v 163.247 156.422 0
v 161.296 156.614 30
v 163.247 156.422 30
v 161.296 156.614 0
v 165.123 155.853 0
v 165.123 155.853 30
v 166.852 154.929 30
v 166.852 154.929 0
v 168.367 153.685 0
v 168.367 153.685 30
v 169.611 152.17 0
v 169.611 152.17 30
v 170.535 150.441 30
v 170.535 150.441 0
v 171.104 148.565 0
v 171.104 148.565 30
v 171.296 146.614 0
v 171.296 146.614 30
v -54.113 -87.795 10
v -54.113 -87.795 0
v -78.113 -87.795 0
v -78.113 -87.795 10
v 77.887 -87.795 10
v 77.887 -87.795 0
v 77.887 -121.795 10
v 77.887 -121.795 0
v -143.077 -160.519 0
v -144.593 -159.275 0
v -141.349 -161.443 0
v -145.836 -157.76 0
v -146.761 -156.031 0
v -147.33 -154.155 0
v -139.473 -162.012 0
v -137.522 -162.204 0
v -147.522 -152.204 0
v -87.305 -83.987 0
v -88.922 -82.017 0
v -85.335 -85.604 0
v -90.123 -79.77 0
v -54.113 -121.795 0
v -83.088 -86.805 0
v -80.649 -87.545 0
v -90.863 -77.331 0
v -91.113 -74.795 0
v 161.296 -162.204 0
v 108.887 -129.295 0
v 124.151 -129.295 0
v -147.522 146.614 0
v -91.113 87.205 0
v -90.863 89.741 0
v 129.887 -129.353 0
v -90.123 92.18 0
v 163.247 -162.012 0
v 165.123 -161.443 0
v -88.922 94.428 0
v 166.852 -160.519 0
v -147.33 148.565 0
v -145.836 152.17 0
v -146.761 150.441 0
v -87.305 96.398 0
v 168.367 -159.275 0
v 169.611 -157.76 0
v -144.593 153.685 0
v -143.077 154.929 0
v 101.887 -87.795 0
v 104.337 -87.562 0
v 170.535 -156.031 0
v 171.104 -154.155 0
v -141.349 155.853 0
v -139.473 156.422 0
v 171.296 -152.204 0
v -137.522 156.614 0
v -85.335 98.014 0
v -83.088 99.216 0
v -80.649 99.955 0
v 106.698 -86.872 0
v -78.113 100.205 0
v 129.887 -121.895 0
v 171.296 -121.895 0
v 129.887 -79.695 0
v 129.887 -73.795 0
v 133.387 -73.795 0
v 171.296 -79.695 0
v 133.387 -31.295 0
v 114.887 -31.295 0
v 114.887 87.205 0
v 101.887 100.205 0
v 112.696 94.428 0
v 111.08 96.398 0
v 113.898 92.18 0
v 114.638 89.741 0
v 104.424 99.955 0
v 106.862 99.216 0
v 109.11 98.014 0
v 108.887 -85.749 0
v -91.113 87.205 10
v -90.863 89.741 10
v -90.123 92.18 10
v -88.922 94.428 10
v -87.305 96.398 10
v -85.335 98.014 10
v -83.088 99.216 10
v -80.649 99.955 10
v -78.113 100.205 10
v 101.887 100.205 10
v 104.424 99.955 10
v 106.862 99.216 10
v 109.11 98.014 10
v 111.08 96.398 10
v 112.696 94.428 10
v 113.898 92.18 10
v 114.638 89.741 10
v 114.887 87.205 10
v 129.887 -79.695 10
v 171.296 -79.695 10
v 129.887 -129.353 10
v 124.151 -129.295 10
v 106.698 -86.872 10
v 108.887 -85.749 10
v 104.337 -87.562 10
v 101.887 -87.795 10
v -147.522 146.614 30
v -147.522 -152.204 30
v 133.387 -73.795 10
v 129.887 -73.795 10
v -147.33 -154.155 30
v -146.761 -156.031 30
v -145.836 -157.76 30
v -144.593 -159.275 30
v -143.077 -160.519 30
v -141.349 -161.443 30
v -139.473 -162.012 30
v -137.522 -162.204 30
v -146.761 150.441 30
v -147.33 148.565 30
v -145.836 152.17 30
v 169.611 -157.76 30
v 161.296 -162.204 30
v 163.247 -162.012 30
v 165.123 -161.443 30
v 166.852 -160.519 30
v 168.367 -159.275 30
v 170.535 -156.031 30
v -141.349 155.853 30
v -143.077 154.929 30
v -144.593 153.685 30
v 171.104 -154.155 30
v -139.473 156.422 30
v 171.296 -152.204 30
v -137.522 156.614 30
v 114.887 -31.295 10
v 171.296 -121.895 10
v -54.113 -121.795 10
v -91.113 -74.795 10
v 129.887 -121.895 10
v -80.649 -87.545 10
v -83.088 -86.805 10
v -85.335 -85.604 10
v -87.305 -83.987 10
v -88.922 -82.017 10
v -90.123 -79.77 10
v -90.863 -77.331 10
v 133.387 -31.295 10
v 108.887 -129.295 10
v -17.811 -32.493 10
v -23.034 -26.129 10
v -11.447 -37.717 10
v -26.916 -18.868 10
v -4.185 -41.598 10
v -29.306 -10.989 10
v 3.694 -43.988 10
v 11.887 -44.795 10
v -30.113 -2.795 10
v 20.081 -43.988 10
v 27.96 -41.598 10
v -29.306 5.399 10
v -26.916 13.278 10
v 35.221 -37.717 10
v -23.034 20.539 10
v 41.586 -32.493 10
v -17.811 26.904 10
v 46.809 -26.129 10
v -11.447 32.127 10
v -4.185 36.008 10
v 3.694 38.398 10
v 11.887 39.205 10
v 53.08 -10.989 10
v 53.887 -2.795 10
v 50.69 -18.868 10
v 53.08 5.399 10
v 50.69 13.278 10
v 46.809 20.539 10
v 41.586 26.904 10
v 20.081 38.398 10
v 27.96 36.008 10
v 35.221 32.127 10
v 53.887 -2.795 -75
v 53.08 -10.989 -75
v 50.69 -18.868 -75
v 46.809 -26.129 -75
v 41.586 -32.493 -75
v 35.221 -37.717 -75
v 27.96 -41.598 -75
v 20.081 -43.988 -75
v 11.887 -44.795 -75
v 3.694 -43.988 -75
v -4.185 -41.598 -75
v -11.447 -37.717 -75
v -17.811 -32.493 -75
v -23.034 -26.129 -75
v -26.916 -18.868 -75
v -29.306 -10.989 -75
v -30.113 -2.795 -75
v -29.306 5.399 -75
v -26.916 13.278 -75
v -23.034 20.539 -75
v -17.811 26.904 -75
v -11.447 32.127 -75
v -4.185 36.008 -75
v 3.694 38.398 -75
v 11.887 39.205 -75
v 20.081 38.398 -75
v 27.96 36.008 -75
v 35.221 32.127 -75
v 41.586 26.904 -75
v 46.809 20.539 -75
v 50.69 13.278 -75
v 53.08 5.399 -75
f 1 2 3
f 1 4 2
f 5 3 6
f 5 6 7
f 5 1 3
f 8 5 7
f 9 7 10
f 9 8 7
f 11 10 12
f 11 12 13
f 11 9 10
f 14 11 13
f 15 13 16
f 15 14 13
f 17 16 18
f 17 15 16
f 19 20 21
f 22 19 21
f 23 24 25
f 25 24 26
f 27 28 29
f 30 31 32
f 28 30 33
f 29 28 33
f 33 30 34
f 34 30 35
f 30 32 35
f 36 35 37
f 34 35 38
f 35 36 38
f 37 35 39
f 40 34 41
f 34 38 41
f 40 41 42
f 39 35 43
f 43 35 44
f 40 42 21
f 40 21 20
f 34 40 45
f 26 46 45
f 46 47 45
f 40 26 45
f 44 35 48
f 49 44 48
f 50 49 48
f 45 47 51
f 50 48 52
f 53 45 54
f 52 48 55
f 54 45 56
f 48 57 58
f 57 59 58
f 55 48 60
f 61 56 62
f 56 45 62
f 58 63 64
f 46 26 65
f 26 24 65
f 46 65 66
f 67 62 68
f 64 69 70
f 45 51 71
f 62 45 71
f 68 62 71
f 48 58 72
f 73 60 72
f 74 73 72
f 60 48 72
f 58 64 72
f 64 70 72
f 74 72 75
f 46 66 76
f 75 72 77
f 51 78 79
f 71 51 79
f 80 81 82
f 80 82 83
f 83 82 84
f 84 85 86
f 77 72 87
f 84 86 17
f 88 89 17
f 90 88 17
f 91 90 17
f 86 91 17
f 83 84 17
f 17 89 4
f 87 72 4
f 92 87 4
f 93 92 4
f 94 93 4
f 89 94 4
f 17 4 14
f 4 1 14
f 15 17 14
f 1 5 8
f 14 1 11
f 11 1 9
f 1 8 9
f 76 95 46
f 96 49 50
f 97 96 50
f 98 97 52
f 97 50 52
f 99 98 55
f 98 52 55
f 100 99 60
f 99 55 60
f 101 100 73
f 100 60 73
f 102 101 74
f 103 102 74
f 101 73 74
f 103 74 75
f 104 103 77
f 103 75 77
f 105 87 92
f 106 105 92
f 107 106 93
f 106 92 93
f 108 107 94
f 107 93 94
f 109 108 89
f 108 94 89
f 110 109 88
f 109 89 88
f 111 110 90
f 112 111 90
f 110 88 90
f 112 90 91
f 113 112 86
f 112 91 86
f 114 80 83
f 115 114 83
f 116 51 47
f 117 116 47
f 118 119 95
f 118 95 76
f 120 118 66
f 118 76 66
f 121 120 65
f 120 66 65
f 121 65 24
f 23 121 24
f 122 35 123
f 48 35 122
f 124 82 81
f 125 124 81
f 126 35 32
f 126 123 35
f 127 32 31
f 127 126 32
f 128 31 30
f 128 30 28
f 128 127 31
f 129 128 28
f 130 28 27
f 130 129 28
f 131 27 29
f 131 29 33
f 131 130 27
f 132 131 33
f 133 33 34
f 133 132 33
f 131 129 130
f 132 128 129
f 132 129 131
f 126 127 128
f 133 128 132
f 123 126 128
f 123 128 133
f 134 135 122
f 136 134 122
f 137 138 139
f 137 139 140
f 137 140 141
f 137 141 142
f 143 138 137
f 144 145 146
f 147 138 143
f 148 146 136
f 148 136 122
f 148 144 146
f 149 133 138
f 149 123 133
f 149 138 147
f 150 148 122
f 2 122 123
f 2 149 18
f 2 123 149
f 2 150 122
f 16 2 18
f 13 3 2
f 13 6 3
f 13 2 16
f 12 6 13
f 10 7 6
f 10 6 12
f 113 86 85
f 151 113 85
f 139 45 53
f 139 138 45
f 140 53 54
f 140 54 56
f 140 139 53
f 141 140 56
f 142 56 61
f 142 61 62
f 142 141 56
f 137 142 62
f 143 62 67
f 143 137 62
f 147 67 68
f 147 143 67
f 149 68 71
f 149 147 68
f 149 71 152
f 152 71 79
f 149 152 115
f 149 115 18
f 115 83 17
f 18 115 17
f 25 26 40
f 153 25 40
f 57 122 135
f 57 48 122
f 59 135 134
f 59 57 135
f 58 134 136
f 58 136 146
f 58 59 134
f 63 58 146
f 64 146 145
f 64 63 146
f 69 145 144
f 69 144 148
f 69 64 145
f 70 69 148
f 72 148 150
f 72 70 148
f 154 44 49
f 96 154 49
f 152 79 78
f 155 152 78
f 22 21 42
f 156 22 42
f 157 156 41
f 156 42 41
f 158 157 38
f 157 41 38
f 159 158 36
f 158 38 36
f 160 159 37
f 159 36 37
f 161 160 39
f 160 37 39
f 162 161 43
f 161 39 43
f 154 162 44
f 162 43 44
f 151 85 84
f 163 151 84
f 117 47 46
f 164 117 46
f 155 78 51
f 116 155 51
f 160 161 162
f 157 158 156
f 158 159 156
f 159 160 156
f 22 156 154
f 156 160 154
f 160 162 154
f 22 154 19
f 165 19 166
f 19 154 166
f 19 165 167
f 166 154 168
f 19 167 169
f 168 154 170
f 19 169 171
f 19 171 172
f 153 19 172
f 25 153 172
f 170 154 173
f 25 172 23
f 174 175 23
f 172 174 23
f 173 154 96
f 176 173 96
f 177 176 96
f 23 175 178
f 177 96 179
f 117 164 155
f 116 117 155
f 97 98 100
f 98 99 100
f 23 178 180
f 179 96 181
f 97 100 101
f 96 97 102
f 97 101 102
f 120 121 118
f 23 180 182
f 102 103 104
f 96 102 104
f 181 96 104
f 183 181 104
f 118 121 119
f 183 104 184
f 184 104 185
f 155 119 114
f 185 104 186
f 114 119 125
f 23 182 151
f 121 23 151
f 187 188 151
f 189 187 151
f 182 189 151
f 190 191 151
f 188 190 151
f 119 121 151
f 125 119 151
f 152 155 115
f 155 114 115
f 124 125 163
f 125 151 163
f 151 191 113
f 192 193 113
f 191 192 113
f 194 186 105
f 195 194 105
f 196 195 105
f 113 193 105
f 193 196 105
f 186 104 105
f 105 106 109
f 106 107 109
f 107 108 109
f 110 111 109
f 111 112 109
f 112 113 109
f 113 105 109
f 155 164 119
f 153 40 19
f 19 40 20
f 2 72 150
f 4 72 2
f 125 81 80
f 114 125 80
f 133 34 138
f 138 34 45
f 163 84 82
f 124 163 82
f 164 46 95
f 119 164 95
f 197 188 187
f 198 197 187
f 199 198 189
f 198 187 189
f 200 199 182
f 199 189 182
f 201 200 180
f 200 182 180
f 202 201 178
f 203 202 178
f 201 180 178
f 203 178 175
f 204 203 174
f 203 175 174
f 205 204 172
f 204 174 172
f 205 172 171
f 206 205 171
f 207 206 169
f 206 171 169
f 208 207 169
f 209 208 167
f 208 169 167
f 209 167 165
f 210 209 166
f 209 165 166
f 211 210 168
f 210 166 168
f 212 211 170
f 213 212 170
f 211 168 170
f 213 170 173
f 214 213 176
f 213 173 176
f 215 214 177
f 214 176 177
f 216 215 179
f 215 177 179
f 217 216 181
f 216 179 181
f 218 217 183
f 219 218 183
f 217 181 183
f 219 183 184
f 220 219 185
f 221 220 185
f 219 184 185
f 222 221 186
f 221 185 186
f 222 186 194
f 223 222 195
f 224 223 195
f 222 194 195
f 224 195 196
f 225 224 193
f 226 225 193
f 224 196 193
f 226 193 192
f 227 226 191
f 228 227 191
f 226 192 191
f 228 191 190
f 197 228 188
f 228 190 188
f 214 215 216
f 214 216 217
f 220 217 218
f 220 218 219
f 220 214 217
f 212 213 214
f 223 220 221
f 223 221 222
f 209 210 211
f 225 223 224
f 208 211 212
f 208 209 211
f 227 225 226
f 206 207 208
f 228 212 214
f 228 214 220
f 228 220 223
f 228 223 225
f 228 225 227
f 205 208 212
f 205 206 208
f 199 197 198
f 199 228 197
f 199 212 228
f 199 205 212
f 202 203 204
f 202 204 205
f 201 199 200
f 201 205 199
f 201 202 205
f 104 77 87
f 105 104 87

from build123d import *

# Parameters (mm, degrees)
EXTRUDE_1_DEPTH = 10
SKETCH_4_W      = 318.818129974
SKETCH_4_H      = 318.818129974
EXTRUDE_3_DEPTH = 20
SKETCH_6_R      = 42
EXTRUDE_4_DEPTH = 85
FILLET_1_R      = 10


with BuildPart() as part:
    # 草图2 → 凸台-拉伸1 (new body)
    with BuildSketch(Plane.XY):
        with BuildLine():
            Line((171.296424673, 156.614258314), (-147.521705301, 156.614258314))
            Line((-147.521705301, 156.614258314), (-147.521705301, -162.20387166))
            Line((-147.521705301, -162.20387166), (171.296424673, -162.20387166))
            Line((171.296424673, -162.20387166), (171.296424673, -121.894806673))
            Line((171.296424673, -121.894806673), (129.887359686, -121.894806673))
            Line((129.887359686, -121.894806673), (129.887359686, -129.352869657))
            Line((129.887359686, -129.352869657), (124.15096929, -129.294806673))
            Line((124.15096929, -129.294806673), (108.887359686, -129.294806673))
            Line((108.887359686, -129.294806673), (108.887359686, -85.749257823))
            ThreePointArc((108.887359686, -85.749257823), (105.533737001, -87.272944854), (101.887359686, -87.794806673))
            Line((101.887359686, -87.794806673), (77.887359686, -87.794806673))
            Line((77.887359686, -87.794806673), (77.887359686, -121.794806673))
            Line((77.887359686, -121.794806673), (-54.112640314, -121.794806673))
            Line((-54.112640314, -121.794806673), (-54.112640314, -87.794806673))
            Line((-54.112640314, -87.794806673), (-78.112640314, -87.794806673))
            ThreePointArc((-78.112640314, -87.794806673), (-87.305028469, -83.987194828), (-91.112640314, -74.794806673))
            Line((-91.112640314, -74.794806673), (-91.112640314, 87.205193327))
            ThreePointArc((-91.112640314, 87.205193327), (-87.305028469, 96.397581483), (-78.112640314, 100.205193327))
            Line((-78.112640314, 100.205193327), (101.887359686, 100.205193327))
            ThreePointArc((101.887359686, 100.205193327), (111.079747841, 96.397581483), (114.887359686, 87.205193327))
            Line((114.887359686, 87.205193327), (114.887359686, -31.294806673))
            Line((114.887359686, -31.294806673), (133.387359686, -31.294806673))
            Line((133.387359686, -31.294806673), (133.387359686, -37.294806673))
            Line((133.387359686, -37.294806673), (133.387359686, -73.794806673))
            Line((133.387359686, -73.794806673), (129.887359686, -73.794806673))
            Line((129.887359686, -73.794806673), (129.887359686, -79.694806673))
            Line((129.887359686, -79.694806673), (171.296424673, -79.694806673))
            Line((171.296424673, -79.694806673), (171.296424673, 156.614258314))
        make_face()
    extrude(amount=EXTRUDE_1_DEPTH)

    # 草图4 → 凸台-拉伸3 (add)
    with BuildSketch(Plane.XY.offset(10)):
        with Locations((11.887359686, -2.794806673)):
            Rectangle(SKETCH_4_W, SKETCH_4_H)
    extrude(amount=EXTRUDE_3_DEPTH)

    # 草图6 → 凸台-拉伸4 (add)
    with BuildSketch(Plane(origin=(0, 0, 10), x_dir=(-1, 0, 0), z_dir=(0, 0, -1))):
        with Locations(Location((-11.887359686, -2.794806673, 0), (0, 0, 180))):
            Circle(SKETCH_6_R)
    extrude(amount=EXTRUDE_4_DEPTH)

    # 圆角1
    fillet_1_edges = [part.edges().sort_by_distance(p)[0] for p in [
        (171.296424673, -162.20387166, 15),
        (-147.521705301, -162.20387166, 15),
        (-147.521705301, 156.614258314, 15),
        (171.296424673, 156.614258314, 15),
    ]]
    fillet(fillet_1_edges, radius=FILLET_1_R)


solid = part.part
